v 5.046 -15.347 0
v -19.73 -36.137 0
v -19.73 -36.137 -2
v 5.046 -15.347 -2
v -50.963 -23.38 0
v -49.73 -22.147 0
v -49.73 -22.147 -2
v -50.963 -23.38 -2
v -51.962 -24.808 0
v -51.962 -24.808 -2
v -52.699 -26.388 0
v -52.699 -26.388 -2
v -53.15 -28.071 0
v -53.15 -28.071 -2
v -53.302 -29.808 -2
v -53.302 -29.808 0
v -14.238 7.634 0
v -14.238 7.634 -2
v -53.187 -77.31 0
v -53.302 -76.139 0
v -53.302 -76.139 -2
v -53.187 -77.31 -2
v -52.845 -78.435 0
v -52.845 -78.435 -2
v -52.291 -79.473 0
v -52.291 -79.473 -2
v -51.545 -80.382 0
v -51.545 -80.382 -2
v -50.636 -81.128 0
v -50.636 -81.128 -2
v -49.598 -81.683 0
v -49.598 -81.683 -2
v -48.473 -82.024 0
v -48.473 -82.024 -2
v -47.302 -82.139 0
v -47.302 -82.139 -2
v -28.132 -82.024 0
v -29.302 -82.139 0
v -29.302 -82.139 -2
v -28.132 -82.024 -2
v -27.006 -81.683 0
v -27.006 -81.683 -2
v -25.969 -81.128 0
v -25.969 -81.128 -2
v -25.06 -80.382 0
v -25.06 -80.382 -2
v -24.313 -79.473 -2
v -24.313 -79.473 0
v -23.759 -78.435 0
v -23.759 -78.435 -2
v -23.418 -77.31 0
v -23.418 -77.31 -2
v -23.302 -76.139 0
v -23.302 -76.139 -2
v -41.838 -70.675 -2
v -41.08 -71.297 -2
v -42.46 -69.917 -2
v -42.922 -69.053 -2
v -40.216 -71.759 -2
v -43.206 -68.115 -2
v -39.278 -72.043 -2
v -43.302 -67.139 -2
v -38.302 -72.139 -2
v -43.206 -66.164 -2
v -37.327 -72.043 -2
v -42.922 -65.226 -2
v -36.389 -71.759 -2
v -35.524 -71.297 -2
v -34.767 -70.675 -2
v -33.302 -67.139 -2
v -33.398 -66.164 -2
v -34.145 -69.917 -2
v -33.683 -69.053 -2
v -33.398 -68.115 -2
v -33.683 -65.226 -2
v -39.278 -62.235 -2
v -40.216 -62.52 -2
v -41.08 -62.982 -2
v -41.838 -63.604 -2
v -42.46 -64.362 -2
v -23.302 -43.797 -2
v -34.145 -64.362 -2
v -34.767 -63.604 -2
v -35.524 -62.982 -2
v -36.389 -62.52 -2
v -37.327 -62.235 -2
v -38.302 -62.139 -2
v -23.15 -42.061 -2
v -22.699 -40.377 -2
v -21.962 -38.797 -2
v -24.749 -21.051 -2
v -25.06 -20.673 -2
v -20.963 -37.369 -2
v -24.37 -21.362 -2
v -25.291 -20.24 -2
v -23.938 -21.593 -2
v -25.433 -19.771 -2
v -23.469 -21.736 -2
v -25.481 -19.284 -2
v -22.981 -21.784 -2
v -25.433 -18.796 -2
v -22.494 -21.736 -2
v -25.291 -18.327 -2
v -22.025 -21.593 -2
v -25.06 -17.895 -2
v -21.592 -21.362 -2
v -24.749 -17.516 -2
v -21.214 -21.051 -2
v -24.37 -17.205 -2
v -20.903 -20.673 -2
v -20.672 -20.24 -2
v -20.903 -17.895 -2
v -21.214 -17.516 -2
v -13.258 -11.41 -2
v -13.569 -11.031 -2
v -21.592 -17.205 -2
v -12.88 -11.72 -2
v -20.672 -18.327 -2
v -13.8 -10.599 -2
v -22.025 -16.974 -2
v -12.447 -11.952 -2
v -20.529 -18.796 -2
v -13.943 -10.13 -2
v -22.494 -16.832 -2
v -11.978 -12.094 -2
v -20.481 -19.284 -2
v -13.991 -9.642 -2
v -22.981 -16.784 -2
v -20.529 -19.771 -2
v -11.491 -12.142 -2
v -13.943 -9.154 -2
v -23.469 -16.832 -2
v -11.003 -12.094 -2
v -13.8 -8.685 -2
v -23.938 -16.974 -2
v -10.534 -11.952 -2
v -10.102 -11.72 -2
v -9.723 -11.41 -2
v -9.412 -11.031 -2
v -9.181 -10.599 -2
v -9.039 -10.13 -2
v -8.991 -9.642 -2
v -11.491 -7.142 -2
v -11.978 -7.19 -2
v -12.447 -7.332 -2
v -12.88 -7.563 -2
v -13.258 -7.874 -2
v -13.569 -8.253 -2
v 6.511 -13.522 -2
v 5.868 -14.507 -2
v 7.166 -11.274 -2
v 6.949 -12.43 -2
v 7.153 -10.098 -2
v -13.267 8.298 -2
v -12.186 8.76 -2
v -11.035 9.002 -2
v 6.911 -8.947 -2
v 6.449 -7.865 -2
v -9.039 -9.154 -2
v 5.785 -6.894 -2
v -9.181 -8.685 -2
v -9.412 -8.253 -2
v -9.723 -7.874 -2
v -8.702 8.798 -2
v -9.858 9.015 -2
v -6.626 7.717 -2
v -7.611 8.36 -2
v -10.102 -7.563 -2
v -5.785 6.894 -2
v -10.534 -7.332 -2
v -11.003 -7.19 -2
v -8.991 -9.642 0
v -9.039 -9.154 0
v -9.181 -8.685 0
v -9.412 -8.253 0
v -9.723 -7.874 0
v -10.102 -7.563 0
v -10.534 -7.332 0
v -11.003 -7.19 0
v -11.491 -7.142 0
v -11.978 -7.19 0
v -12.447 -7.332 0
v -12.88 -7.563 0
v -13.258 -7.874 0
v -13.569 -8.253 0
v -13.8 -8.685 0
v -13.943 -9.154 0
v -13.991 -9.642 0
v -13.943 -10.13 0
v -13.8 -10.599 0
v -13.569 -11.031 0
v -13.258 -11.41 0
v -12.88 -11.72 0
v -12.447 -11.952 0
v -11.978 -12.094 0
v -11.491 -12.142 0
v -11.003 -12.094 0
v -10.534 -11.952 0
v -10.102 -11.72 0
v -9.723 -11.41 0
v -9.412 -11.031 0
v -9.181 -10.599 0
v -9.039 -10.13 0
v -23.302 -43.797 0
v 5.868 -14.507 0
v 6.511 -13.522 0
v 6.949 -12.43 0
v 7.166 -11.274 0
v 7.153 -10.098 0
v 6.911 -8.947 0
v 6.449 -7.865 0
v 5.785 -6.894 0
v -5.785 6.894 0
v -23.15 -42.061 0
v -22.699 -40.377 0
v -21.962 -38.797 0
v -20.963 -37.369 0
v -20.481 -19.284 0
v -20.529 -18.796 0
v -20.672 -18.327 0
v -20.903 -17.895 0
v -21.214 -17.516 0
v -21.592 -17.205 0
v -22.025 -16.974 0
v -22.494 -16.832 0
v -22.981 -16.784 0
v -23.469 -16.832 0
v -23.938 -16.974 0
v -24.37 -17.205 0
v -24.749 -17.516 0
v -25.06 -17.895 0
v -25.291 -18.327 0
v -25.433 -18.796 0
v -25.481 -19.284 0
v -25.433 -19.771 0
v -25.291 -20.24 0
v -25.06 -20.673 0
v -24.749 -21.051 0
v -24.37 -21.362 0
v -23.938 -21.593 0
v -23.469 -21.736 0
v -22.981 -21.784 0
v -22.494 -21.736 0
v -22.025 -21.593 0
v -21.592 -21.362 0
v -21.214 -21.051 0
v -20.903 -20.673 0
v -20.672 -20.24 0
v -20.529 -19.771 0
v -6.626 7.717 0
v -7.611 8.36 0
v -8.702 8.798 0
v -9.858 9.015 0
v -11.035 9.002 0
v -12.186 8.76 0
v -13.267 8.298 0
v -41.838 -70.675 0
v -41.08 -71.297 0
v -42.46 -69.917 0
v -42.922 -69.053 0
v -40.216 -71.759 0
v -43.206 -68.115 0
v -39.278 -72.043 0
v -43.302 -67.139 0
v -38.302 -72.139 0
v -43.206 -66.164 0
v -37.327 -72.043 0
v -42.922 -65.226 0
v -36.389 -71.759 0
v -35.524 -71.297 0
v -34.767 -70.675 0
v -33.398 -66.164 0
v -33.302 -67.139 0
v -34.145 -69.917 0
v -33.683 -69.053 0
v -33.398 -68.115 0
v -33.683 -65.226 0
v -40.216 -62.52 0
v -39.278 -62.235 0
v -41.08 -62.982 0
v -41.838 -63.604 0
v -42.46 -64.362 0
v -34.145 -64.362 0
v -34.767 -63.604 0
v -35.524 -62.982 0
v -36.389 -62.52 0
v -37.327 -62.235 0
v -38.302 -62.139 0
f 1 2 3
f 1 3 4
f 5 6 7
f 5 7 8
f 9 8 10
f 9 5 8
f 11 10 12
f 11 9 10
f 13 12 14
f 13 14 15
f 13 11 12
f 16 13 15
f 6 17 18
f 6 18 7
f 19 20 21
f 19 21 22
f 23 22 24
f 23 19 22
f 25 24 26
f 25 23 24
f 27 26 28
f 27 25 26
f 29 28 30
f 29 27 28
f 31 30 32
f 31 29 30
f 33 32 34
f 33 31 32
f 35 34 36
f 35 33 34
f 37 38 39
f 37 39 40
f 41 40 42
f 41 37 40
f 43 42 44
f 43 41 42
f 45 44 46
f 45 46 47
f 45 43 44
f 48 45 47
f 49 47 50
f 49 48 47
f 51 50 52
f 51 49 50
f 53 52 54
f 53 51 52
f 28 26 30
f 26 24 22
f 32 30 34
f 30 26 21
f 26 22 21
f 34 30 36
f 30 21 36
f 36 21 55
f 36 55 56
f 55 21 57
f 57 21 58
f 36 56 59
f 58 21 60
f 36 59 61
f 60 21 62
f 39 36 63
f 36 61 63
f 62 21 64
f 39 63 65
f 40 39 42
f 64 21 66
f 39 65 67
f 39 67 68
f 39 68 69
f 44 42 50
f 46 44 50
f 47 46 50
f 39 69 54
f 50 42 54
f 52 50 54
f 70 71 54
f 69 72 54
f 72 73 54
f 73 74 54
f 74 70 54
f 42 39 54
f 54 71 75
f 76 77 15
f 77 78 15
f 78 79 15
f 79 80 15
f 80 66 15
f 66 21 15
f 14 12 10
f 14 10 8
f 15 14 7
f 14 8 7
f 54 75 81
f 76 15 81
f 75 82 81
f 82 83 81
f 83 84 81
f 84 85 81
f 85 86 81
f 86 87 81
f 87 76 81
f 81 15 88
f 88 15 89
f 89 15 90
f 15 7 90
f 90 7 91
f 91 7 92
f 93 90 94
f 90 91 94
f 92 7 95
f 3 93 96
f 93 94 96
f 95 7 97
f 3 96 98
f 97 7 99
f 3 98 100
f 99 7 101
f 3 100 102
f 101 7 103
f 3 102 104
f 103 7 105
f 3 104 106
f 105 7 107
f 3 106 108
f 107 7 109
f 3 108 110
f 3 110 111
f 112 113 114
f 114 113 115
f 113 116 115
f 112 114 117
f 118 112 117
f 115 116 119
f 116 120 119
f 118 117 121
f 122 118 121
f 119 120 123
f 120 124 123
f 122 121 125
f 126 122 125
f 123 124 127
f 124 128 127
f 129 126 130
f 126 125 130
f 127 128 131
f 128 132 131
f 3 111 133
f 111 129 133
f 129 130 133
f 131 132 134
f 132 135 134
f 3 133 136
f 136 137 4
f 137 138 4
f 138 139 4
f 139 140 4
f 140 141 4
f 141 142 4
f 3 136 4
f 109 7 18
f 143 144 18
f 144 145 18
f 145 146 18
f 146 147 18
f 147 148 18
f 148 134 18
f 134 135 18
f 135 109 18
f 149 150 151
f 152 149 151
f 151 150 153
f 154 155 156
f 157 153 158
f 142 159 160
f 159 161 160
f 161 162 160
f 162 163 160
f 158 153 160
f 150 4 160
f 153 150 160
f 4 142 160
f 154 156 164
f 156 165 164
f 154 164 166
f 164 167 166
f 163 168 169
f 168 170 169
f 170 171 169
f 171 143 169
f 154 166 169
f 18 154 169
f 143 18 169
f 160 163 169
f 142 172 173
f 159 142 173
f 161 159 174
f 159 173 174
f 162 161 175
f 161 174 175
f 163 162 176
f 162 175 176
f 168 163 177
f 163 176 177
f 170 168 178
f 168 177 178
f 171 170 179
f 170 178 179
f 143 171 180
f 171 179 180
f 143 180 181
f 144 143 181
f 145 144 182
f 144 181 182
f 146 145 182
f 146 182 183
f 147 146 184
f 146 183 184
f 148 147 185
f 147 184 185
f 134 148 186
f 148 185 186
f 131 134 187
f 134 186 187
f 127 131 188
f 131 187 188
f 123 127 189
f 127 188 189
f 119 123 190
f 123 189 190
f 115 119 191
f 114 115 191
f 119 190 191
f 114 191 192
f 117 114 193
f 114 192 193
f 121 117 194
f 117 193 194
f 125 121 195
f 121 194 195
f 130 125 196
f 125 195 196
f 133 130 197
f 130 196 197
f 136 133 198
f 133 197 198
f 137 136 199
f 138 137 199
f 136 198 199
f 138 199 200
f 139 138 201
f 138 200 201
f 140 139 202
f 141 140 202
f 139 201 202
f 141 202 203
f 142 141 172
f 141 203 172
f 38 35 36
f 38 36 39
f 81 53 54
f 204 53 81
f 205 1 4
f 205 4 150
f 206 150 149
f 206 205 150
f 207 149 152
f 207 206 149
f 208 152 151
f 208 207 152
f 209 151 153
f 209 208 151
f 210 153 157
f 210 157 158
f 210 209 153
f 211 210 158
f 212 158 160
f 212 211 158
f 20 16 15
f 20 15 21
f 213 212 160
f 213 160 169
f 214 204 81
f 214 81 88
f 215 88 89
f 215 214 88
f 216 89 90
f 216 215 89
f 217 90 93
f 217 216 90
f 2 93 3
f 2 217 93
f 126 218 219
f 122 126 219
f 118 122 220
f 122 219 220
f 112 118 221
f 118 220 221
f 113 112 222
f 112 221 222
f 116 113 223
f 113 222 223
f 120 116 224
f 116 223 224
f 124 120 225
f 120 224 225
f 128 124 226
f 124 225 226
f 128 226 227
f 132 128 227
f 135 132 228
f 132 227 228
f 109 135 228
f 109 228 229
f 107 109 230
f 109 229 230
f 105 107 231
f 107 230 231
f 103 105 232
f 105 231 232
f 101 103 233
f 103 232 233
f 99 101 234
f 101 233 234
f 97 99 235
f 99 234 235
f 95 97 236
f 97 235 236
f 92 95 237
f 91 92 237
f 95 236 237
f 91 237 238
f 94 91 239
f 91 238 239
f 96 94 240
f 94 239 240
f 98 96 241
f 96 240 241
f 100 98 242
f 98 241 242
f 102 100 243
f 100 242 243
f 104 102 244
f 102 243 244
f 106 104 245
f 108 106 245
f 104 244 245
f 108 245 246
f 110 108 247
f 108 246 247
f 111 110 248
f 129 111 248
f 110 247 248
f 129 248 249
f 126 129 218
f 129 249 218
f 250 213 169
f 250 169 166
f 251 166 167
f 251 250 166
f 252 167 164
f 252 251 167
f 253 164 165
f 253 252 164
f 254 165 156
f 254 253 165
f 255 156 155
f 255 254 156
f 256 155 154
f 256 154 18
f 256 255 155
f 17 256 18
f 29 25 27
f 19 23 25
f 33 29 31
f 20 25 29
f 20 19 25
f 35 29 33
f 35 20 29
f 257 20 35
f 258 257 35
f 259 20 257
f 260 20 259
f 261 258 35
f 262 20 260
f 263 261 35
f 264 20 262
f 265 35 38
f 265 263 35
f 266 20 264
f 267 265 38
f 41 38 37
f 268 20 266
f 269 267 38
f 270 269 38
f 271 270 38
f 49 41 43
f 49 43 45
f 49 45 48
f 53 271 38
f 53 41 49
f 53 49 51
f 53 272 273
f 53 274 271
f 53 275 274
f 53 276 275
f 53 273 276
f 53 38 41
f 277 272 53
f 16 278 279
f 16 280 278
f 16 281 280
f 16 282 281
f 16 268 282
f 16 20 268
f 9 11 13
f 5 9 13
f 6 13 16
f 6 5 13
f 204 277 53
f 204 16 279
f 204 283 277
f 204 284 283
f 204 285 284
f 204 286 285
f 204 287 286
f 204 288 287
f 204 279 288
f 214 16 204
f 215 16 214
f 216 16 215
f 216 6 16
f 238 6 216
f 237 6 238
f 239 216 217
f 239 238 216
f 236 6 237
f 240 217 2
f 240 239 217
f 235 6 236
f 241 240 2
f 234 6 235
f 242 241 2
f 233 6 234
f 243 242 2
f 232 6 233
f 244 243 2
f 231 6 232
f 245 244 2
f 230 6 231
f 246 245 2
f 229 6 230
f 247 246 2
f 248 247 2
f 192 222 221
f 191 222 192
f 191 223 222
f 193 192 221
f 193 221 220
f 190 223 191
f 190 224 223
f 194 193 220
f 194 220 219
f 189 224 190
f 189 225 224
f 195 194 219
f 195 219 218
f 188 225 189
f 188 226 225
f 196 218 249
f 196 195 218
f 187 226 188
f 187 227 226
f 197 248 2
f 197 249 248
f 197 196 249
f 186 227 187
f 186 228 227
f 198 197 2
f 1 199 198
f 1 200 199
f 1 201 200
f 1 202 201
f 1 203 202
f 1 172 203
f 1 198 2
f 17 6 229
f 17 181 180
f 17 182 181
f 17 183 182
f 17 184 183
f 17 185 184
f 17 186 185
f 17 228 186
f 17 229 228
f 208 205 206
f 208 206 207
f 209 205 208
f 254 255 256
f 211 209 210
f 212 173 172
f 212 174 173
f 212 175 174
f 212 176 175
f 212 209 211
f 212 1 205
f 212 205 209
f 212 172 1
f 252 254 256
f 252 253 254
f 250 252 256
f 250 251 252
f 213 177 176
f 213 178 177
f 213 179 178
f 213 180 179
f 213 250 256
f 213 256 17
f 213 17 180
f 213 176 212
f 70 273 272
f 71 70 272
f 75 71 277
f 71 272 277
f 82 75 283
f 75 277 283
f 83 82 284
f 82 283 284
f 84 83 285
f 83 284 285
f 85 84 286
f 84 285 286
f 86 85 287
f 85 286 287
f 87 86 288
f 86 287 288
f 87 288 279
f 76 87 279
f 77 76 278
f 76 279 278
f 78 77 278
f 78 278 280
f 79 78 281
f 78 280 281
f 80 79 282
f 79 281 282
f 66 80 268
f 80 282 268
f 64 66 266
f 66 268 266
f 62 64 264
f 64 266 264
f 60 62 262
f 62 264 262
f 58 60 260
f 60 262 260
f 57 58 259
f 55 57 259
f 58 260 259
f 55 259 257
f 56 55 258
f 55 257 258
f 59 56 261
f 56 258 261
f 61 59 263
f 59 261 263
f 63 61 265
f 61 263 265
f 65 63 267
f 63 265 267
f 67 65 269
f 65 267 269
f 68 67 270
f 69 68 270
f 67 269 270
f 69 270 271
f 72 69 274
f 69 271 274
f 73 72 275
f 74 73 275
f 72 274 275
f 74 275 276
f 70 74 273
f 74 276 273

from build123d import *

# Parameters (mm, degrees)
SKETCH1_R          = 5
SKETCH1_R_2        = 2.5
BASE_FLANGE1_DEPTH = 2


# Sheet-metal steps are written as plain solids
with BuildPart() as part:
    # Sketch1 → Base-Flange1 (new body)
    with BuildSketch(Plane.XY):
        with BuildLine():
            Line((-14.238080804, 7.633940989), (-49.730098253, -22.147397762))
            ThreePointArc((-49.730098253, -22.147397762), (-52.365300026, -25.581659576), (-53.302222156, -29.807842194))
            Line((-53.302222156, -29.807842194), (-53.302222156, -48.56164166))
            Line((-53.302222156, -48.56164166), (-53.302222156, -76.139380484))
            ThreePointArc((-53.302222156, -76.139380484), (-51.544862843, -80.382021171), (-47.302222156, -82.139380484))
            Line((-47.302222156, -82.139380484), (-29.302222156, -82.139380484))
            ThreePointArc((-29.302222156, -82.139380484), (-25.059581469, -80.382021171), (-23.302222156, -76.139380484))
            Line((-23.302222156, -76.139380484), (-23.302222156, -48.56164166))
            Line((-23.302222156, -48.56164166), (-23.302222156, -43.797071938))
            ThreePointArc((-23.302222156, -43.797071938), (-22.365300026, -39.570889321), (-19.730098253, -36.136627507))
            Line((-19.730098253, -36.136627507), (5.045547487, -15.347392305))
            ThreePointArc((5.045547487, -15.347392305), (7.165990017, -11.274060103), (5.785088487, -6.894399988))
            Line((5.785088487, -6.894399988), (-5.785088487, 6.894399988))
            ThreePointArc((-5.785088487, 6.894399988), (-9.858420689, 9.014842519), (-14.238080804, 7.633940989))
        make_face()
        with Locations((-38.302222156, -67.139380484)):
            Circle(SKETCH1_R, mode=Mode.SUBTRACT)
        with Locations((-11.490666647, -9.641814145)):
            Circle(SKETCH1_R_2, mode=Mode.SUBTRACT)
        with Locations((-22.981333294, -19.283628291)):
            Circle(SKETCH1_R_2, mode=Mode.SUBTRACT)
    extrude(amount=-BASE_FLANGE1_DEPTH)


solid = part.part
